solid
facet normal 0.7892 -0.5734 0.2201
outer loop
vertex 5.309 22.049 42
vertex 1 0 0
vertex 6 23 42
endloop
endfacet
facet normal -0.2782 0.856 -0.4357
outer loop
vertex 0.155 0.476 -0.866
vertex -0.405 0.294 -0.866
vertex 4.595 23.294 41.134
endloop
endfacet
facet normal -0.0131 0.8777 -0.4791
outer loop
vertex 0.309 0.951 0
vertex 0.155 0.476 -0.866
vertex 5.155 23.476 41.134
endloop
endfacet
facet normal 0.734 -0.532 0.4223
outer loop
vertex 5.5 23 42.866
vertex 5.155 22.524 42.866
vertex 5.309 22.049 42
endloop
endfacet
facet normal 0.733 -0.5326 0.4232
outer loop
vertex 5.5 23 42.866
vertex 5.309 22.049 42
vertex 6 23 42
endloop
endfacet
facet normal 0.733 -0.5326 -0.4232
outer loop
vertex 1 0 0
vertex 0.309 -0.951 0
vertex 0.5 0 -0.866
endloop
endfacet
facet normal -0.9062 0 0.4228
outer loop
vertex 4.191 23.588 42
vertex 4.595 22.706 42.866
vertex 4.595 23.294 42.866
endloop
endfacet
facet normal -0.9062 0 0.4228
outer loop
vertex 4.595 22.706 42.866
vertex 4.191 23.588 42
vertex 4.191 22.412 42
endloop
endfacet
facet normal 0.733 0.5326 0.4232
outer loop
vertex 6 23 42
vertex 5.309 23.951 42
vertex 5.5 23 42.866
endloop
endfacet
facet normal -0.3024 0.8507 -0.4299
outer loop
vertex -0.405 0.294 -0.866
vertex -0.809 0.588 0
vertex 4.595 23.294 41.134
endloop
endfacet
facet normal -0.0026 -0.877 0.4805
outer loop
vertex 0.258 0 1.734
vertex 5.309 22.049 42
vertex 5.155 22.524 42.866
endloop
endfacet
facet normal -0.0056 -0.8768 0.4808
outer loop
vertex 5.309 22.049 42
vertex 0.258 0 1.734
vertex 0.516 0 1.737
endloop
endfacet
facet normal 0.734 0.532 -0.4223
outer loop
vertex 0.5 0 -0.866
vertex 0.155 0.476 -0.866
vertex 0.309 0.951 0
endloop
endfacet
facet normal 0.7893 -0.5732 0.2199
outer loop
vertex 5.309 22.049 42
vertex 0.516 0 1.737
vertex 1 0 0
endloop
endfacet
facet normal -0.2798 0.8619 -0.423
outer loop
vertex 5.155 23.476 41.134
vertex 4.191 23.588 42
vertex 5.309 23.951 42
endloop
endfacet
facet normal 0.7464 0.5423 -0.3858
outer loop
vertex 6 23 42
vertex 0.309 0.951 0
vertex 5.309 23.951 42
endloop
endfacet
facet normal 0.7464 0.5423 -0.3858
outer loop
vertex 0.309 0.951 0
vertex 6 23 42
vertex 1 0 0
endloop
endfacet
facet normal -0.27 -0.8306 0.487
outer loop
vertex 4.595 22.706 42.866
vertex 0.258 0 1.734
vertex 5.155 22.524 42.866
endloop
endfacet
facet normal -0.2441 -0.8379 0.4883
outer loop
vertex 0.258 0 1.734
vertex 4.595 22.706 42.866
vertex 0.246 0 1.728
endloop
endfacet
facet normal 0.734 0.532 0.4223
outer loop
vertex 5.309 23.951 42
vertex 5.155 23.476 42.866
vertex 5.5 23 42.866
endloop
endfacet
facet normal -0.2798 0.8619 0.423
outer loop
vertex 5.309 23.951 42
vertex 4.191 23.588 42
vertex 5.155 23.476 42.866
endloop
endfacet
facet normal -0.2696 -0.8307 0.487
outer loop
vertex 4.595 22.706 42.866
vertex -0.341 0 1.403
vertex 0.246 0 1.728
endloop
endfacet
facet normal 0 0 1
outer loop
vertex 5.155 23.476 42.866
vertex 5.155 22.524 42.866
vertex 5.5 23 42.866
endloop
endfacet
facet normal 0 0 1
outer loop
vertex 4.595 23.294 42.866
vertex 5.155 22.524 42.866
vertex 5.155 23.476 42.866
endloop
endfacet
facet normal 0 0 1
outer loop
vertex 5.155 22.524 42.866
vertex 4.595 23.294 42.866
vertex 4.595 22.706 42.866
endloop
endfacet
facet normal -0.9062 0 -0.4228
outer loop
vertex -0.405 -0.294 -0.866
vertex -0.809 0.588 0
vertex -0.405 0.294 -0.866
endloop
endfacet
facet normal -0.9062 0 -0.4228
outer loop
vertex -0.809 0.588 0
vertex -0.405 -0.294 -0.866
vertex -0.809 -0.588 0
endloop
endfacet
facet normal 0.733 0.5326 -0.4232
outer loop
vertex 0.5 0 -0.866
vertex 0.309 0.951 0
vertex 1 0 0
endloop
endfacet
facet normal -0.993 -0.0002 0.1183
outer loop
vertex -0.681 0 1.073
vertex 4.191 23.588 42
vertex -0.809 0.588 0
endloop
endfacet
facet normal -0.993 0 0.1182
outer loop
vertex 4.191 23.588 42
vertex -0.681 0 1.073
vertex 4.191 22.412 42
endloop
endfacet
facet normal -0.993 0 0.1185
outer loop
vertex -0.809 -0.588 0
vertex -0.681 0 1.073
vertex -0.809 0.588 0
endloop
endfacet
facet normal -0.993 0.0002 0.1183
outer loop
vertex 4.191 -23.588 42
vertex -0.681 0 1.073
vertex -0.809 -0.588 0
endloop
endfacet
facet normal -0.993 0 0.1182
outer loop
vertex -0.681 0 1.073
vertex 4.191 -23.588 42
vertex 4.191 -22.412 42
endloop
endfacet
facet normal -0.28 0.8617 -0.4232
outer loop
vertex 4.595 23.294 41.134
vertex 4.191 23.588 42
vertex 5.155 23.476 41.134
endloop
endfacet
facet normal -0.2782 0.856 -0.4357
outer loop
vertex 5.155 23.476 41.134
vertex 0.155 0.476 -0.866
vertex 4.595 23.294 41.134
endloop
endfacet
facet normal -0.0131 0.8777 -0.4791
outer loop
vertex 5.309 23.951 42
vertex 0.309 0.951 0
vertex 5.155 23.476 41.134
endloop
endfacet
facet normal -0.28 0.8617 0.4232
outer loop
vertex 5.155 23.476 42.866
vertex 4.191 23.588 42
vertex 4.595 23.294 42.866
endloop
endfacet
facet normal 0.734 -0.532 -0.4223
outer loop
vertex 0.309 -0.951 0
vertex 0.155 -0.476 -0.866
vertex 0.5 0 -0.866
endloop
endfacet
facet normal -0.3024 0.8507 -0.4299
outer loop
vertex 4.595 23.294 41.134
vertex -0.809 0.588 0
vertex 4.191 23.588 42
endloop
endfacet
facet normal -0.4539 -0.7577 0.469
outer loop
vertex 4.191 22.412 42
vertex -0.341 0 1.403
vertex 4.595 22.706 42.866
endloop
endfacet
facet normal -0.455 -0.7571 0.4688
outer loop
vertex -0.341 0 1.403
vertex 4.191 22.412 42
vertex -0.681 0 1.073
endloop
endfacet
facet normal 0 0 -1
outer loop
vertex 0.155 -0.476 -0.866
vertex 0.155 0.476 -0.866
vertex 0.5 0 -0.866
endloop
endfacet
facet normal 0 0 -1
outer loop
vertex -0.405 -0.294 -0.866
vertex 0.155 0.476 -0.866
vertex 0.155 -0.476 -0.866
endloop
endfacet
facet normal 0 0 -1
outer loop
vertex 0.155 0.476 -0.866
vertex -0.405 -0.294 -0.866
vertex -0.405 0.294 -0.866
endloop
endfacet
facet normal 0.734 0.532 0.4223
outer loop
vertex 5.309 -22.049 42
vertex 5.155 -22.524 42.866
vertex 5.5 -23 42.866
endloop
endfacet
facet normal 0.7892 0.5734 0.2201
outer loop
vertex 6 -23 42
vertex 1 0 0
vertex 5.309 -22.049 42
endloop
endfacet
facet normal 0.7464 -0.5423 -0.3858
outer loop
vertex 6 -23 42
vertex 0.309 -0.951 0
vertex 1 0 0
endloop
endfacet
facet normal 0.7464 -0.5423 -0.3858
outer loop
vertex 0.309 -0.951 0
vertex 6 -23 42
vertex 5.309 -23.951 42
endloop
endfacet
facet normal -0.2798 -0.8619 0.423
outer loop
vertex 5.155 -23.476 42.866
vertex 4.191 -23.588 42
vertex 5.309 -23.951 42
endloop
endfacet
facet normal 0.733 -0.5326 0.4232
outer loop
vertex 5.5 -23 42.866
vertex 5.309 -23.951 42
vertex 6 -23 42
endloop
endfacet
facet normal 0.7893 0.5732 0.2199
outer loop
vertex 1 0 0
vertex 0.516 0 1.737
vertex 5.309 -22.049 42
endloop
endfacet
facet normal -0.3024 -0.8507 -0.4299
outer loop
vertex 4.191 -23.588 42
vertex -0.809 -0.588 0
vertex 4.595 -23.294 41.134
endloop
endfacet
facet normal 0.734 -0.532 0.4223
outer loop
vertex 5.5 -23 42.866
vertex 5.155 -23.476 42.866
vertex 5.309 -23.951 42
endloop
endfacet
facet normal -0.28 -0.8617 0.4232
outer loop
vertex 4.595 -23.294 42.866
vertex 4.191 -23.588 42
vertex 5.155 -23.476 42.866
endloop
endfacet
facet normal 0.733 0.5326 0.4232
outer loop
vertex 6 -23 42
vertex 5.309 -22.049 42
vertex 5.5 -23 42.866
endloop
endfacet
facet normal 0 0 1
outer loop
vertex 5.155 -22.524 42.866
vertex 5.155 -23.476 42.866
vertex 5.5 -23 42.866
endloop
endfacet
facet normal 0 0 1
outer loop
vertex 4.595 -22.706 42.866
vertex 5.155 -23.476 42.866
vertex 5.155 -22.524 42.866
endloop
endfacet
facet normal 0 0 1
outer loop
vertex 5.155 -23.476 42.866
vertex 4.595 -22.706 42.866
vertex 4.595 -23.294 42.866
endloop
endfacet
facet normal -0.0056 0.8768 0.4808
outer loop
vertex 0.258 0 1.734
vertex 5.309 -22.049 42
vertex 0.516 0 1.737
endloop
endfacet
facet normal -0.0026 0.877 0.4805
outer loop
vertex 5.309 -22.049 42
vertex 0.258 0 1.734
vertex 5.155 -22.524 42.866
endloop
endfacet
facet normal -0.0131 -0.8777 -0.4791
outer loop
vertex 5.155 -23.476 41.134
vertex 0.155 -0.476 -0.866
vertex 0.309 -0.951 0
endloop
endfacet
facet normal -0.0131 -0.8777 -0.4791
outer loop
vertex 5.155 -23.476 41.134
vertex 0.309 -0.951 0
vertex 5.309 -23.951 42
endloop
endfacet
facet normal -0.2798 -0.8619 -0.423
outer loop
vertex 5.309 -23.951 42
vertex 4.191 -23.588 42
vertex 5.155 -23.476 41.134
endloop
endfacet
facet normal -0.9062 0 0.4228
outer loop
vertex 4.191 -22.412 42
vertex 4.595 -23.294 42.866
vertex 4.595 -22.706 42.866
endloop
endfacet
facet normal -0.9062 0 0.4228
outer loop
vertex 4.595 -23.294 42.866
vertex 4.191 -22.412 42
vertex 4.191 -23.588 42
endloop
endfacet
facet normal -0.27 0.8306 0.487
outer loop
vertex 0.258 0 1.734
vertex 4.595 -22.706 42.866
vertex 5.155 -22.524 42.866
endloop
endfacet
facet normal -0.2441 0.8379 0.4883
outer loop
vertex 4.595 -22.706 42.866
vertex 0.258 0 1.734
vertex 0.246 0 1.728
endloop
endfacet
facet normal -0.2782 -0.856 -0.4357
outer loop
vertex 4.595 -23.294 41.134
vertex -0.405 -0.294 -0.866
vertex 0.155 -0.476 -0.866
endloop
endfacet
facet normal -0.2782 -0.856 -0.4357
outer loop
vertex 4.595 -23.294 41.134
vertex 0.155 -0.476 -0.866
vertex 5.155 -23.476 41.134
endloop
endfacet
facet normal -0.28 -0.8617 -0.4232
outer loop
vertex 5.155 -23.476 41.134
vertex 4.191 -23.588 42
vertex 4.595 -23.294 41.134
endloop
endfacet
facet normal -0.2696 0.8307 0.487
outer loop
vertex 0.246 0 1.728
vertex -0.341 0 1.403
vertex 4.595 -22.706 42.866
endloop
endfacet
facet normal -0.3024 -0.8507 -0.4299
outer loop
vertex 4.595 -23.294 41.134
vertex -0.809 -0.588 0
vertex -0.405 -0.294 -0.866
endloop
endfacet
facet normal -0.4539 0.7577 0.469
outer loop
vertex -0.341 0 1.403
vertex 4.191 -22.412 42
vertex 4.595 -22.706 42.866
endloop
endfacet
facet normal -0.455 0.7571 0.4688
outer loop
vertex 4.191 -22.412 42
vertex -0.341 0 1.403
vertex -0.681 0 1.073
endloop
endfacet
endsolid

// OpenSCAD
module web(x, y, z, thick, radiusMin, radiusMax, radianMin, radianMax) {
}
module line(start, end, thickness = 1) {
    hull() {
        translate(start) sphere(thickness);
        translate(end) sphere(thickness);
    }
}

line([0,0,0], [5,23,42]);
line([0,0,0], [5,-23,42]);
